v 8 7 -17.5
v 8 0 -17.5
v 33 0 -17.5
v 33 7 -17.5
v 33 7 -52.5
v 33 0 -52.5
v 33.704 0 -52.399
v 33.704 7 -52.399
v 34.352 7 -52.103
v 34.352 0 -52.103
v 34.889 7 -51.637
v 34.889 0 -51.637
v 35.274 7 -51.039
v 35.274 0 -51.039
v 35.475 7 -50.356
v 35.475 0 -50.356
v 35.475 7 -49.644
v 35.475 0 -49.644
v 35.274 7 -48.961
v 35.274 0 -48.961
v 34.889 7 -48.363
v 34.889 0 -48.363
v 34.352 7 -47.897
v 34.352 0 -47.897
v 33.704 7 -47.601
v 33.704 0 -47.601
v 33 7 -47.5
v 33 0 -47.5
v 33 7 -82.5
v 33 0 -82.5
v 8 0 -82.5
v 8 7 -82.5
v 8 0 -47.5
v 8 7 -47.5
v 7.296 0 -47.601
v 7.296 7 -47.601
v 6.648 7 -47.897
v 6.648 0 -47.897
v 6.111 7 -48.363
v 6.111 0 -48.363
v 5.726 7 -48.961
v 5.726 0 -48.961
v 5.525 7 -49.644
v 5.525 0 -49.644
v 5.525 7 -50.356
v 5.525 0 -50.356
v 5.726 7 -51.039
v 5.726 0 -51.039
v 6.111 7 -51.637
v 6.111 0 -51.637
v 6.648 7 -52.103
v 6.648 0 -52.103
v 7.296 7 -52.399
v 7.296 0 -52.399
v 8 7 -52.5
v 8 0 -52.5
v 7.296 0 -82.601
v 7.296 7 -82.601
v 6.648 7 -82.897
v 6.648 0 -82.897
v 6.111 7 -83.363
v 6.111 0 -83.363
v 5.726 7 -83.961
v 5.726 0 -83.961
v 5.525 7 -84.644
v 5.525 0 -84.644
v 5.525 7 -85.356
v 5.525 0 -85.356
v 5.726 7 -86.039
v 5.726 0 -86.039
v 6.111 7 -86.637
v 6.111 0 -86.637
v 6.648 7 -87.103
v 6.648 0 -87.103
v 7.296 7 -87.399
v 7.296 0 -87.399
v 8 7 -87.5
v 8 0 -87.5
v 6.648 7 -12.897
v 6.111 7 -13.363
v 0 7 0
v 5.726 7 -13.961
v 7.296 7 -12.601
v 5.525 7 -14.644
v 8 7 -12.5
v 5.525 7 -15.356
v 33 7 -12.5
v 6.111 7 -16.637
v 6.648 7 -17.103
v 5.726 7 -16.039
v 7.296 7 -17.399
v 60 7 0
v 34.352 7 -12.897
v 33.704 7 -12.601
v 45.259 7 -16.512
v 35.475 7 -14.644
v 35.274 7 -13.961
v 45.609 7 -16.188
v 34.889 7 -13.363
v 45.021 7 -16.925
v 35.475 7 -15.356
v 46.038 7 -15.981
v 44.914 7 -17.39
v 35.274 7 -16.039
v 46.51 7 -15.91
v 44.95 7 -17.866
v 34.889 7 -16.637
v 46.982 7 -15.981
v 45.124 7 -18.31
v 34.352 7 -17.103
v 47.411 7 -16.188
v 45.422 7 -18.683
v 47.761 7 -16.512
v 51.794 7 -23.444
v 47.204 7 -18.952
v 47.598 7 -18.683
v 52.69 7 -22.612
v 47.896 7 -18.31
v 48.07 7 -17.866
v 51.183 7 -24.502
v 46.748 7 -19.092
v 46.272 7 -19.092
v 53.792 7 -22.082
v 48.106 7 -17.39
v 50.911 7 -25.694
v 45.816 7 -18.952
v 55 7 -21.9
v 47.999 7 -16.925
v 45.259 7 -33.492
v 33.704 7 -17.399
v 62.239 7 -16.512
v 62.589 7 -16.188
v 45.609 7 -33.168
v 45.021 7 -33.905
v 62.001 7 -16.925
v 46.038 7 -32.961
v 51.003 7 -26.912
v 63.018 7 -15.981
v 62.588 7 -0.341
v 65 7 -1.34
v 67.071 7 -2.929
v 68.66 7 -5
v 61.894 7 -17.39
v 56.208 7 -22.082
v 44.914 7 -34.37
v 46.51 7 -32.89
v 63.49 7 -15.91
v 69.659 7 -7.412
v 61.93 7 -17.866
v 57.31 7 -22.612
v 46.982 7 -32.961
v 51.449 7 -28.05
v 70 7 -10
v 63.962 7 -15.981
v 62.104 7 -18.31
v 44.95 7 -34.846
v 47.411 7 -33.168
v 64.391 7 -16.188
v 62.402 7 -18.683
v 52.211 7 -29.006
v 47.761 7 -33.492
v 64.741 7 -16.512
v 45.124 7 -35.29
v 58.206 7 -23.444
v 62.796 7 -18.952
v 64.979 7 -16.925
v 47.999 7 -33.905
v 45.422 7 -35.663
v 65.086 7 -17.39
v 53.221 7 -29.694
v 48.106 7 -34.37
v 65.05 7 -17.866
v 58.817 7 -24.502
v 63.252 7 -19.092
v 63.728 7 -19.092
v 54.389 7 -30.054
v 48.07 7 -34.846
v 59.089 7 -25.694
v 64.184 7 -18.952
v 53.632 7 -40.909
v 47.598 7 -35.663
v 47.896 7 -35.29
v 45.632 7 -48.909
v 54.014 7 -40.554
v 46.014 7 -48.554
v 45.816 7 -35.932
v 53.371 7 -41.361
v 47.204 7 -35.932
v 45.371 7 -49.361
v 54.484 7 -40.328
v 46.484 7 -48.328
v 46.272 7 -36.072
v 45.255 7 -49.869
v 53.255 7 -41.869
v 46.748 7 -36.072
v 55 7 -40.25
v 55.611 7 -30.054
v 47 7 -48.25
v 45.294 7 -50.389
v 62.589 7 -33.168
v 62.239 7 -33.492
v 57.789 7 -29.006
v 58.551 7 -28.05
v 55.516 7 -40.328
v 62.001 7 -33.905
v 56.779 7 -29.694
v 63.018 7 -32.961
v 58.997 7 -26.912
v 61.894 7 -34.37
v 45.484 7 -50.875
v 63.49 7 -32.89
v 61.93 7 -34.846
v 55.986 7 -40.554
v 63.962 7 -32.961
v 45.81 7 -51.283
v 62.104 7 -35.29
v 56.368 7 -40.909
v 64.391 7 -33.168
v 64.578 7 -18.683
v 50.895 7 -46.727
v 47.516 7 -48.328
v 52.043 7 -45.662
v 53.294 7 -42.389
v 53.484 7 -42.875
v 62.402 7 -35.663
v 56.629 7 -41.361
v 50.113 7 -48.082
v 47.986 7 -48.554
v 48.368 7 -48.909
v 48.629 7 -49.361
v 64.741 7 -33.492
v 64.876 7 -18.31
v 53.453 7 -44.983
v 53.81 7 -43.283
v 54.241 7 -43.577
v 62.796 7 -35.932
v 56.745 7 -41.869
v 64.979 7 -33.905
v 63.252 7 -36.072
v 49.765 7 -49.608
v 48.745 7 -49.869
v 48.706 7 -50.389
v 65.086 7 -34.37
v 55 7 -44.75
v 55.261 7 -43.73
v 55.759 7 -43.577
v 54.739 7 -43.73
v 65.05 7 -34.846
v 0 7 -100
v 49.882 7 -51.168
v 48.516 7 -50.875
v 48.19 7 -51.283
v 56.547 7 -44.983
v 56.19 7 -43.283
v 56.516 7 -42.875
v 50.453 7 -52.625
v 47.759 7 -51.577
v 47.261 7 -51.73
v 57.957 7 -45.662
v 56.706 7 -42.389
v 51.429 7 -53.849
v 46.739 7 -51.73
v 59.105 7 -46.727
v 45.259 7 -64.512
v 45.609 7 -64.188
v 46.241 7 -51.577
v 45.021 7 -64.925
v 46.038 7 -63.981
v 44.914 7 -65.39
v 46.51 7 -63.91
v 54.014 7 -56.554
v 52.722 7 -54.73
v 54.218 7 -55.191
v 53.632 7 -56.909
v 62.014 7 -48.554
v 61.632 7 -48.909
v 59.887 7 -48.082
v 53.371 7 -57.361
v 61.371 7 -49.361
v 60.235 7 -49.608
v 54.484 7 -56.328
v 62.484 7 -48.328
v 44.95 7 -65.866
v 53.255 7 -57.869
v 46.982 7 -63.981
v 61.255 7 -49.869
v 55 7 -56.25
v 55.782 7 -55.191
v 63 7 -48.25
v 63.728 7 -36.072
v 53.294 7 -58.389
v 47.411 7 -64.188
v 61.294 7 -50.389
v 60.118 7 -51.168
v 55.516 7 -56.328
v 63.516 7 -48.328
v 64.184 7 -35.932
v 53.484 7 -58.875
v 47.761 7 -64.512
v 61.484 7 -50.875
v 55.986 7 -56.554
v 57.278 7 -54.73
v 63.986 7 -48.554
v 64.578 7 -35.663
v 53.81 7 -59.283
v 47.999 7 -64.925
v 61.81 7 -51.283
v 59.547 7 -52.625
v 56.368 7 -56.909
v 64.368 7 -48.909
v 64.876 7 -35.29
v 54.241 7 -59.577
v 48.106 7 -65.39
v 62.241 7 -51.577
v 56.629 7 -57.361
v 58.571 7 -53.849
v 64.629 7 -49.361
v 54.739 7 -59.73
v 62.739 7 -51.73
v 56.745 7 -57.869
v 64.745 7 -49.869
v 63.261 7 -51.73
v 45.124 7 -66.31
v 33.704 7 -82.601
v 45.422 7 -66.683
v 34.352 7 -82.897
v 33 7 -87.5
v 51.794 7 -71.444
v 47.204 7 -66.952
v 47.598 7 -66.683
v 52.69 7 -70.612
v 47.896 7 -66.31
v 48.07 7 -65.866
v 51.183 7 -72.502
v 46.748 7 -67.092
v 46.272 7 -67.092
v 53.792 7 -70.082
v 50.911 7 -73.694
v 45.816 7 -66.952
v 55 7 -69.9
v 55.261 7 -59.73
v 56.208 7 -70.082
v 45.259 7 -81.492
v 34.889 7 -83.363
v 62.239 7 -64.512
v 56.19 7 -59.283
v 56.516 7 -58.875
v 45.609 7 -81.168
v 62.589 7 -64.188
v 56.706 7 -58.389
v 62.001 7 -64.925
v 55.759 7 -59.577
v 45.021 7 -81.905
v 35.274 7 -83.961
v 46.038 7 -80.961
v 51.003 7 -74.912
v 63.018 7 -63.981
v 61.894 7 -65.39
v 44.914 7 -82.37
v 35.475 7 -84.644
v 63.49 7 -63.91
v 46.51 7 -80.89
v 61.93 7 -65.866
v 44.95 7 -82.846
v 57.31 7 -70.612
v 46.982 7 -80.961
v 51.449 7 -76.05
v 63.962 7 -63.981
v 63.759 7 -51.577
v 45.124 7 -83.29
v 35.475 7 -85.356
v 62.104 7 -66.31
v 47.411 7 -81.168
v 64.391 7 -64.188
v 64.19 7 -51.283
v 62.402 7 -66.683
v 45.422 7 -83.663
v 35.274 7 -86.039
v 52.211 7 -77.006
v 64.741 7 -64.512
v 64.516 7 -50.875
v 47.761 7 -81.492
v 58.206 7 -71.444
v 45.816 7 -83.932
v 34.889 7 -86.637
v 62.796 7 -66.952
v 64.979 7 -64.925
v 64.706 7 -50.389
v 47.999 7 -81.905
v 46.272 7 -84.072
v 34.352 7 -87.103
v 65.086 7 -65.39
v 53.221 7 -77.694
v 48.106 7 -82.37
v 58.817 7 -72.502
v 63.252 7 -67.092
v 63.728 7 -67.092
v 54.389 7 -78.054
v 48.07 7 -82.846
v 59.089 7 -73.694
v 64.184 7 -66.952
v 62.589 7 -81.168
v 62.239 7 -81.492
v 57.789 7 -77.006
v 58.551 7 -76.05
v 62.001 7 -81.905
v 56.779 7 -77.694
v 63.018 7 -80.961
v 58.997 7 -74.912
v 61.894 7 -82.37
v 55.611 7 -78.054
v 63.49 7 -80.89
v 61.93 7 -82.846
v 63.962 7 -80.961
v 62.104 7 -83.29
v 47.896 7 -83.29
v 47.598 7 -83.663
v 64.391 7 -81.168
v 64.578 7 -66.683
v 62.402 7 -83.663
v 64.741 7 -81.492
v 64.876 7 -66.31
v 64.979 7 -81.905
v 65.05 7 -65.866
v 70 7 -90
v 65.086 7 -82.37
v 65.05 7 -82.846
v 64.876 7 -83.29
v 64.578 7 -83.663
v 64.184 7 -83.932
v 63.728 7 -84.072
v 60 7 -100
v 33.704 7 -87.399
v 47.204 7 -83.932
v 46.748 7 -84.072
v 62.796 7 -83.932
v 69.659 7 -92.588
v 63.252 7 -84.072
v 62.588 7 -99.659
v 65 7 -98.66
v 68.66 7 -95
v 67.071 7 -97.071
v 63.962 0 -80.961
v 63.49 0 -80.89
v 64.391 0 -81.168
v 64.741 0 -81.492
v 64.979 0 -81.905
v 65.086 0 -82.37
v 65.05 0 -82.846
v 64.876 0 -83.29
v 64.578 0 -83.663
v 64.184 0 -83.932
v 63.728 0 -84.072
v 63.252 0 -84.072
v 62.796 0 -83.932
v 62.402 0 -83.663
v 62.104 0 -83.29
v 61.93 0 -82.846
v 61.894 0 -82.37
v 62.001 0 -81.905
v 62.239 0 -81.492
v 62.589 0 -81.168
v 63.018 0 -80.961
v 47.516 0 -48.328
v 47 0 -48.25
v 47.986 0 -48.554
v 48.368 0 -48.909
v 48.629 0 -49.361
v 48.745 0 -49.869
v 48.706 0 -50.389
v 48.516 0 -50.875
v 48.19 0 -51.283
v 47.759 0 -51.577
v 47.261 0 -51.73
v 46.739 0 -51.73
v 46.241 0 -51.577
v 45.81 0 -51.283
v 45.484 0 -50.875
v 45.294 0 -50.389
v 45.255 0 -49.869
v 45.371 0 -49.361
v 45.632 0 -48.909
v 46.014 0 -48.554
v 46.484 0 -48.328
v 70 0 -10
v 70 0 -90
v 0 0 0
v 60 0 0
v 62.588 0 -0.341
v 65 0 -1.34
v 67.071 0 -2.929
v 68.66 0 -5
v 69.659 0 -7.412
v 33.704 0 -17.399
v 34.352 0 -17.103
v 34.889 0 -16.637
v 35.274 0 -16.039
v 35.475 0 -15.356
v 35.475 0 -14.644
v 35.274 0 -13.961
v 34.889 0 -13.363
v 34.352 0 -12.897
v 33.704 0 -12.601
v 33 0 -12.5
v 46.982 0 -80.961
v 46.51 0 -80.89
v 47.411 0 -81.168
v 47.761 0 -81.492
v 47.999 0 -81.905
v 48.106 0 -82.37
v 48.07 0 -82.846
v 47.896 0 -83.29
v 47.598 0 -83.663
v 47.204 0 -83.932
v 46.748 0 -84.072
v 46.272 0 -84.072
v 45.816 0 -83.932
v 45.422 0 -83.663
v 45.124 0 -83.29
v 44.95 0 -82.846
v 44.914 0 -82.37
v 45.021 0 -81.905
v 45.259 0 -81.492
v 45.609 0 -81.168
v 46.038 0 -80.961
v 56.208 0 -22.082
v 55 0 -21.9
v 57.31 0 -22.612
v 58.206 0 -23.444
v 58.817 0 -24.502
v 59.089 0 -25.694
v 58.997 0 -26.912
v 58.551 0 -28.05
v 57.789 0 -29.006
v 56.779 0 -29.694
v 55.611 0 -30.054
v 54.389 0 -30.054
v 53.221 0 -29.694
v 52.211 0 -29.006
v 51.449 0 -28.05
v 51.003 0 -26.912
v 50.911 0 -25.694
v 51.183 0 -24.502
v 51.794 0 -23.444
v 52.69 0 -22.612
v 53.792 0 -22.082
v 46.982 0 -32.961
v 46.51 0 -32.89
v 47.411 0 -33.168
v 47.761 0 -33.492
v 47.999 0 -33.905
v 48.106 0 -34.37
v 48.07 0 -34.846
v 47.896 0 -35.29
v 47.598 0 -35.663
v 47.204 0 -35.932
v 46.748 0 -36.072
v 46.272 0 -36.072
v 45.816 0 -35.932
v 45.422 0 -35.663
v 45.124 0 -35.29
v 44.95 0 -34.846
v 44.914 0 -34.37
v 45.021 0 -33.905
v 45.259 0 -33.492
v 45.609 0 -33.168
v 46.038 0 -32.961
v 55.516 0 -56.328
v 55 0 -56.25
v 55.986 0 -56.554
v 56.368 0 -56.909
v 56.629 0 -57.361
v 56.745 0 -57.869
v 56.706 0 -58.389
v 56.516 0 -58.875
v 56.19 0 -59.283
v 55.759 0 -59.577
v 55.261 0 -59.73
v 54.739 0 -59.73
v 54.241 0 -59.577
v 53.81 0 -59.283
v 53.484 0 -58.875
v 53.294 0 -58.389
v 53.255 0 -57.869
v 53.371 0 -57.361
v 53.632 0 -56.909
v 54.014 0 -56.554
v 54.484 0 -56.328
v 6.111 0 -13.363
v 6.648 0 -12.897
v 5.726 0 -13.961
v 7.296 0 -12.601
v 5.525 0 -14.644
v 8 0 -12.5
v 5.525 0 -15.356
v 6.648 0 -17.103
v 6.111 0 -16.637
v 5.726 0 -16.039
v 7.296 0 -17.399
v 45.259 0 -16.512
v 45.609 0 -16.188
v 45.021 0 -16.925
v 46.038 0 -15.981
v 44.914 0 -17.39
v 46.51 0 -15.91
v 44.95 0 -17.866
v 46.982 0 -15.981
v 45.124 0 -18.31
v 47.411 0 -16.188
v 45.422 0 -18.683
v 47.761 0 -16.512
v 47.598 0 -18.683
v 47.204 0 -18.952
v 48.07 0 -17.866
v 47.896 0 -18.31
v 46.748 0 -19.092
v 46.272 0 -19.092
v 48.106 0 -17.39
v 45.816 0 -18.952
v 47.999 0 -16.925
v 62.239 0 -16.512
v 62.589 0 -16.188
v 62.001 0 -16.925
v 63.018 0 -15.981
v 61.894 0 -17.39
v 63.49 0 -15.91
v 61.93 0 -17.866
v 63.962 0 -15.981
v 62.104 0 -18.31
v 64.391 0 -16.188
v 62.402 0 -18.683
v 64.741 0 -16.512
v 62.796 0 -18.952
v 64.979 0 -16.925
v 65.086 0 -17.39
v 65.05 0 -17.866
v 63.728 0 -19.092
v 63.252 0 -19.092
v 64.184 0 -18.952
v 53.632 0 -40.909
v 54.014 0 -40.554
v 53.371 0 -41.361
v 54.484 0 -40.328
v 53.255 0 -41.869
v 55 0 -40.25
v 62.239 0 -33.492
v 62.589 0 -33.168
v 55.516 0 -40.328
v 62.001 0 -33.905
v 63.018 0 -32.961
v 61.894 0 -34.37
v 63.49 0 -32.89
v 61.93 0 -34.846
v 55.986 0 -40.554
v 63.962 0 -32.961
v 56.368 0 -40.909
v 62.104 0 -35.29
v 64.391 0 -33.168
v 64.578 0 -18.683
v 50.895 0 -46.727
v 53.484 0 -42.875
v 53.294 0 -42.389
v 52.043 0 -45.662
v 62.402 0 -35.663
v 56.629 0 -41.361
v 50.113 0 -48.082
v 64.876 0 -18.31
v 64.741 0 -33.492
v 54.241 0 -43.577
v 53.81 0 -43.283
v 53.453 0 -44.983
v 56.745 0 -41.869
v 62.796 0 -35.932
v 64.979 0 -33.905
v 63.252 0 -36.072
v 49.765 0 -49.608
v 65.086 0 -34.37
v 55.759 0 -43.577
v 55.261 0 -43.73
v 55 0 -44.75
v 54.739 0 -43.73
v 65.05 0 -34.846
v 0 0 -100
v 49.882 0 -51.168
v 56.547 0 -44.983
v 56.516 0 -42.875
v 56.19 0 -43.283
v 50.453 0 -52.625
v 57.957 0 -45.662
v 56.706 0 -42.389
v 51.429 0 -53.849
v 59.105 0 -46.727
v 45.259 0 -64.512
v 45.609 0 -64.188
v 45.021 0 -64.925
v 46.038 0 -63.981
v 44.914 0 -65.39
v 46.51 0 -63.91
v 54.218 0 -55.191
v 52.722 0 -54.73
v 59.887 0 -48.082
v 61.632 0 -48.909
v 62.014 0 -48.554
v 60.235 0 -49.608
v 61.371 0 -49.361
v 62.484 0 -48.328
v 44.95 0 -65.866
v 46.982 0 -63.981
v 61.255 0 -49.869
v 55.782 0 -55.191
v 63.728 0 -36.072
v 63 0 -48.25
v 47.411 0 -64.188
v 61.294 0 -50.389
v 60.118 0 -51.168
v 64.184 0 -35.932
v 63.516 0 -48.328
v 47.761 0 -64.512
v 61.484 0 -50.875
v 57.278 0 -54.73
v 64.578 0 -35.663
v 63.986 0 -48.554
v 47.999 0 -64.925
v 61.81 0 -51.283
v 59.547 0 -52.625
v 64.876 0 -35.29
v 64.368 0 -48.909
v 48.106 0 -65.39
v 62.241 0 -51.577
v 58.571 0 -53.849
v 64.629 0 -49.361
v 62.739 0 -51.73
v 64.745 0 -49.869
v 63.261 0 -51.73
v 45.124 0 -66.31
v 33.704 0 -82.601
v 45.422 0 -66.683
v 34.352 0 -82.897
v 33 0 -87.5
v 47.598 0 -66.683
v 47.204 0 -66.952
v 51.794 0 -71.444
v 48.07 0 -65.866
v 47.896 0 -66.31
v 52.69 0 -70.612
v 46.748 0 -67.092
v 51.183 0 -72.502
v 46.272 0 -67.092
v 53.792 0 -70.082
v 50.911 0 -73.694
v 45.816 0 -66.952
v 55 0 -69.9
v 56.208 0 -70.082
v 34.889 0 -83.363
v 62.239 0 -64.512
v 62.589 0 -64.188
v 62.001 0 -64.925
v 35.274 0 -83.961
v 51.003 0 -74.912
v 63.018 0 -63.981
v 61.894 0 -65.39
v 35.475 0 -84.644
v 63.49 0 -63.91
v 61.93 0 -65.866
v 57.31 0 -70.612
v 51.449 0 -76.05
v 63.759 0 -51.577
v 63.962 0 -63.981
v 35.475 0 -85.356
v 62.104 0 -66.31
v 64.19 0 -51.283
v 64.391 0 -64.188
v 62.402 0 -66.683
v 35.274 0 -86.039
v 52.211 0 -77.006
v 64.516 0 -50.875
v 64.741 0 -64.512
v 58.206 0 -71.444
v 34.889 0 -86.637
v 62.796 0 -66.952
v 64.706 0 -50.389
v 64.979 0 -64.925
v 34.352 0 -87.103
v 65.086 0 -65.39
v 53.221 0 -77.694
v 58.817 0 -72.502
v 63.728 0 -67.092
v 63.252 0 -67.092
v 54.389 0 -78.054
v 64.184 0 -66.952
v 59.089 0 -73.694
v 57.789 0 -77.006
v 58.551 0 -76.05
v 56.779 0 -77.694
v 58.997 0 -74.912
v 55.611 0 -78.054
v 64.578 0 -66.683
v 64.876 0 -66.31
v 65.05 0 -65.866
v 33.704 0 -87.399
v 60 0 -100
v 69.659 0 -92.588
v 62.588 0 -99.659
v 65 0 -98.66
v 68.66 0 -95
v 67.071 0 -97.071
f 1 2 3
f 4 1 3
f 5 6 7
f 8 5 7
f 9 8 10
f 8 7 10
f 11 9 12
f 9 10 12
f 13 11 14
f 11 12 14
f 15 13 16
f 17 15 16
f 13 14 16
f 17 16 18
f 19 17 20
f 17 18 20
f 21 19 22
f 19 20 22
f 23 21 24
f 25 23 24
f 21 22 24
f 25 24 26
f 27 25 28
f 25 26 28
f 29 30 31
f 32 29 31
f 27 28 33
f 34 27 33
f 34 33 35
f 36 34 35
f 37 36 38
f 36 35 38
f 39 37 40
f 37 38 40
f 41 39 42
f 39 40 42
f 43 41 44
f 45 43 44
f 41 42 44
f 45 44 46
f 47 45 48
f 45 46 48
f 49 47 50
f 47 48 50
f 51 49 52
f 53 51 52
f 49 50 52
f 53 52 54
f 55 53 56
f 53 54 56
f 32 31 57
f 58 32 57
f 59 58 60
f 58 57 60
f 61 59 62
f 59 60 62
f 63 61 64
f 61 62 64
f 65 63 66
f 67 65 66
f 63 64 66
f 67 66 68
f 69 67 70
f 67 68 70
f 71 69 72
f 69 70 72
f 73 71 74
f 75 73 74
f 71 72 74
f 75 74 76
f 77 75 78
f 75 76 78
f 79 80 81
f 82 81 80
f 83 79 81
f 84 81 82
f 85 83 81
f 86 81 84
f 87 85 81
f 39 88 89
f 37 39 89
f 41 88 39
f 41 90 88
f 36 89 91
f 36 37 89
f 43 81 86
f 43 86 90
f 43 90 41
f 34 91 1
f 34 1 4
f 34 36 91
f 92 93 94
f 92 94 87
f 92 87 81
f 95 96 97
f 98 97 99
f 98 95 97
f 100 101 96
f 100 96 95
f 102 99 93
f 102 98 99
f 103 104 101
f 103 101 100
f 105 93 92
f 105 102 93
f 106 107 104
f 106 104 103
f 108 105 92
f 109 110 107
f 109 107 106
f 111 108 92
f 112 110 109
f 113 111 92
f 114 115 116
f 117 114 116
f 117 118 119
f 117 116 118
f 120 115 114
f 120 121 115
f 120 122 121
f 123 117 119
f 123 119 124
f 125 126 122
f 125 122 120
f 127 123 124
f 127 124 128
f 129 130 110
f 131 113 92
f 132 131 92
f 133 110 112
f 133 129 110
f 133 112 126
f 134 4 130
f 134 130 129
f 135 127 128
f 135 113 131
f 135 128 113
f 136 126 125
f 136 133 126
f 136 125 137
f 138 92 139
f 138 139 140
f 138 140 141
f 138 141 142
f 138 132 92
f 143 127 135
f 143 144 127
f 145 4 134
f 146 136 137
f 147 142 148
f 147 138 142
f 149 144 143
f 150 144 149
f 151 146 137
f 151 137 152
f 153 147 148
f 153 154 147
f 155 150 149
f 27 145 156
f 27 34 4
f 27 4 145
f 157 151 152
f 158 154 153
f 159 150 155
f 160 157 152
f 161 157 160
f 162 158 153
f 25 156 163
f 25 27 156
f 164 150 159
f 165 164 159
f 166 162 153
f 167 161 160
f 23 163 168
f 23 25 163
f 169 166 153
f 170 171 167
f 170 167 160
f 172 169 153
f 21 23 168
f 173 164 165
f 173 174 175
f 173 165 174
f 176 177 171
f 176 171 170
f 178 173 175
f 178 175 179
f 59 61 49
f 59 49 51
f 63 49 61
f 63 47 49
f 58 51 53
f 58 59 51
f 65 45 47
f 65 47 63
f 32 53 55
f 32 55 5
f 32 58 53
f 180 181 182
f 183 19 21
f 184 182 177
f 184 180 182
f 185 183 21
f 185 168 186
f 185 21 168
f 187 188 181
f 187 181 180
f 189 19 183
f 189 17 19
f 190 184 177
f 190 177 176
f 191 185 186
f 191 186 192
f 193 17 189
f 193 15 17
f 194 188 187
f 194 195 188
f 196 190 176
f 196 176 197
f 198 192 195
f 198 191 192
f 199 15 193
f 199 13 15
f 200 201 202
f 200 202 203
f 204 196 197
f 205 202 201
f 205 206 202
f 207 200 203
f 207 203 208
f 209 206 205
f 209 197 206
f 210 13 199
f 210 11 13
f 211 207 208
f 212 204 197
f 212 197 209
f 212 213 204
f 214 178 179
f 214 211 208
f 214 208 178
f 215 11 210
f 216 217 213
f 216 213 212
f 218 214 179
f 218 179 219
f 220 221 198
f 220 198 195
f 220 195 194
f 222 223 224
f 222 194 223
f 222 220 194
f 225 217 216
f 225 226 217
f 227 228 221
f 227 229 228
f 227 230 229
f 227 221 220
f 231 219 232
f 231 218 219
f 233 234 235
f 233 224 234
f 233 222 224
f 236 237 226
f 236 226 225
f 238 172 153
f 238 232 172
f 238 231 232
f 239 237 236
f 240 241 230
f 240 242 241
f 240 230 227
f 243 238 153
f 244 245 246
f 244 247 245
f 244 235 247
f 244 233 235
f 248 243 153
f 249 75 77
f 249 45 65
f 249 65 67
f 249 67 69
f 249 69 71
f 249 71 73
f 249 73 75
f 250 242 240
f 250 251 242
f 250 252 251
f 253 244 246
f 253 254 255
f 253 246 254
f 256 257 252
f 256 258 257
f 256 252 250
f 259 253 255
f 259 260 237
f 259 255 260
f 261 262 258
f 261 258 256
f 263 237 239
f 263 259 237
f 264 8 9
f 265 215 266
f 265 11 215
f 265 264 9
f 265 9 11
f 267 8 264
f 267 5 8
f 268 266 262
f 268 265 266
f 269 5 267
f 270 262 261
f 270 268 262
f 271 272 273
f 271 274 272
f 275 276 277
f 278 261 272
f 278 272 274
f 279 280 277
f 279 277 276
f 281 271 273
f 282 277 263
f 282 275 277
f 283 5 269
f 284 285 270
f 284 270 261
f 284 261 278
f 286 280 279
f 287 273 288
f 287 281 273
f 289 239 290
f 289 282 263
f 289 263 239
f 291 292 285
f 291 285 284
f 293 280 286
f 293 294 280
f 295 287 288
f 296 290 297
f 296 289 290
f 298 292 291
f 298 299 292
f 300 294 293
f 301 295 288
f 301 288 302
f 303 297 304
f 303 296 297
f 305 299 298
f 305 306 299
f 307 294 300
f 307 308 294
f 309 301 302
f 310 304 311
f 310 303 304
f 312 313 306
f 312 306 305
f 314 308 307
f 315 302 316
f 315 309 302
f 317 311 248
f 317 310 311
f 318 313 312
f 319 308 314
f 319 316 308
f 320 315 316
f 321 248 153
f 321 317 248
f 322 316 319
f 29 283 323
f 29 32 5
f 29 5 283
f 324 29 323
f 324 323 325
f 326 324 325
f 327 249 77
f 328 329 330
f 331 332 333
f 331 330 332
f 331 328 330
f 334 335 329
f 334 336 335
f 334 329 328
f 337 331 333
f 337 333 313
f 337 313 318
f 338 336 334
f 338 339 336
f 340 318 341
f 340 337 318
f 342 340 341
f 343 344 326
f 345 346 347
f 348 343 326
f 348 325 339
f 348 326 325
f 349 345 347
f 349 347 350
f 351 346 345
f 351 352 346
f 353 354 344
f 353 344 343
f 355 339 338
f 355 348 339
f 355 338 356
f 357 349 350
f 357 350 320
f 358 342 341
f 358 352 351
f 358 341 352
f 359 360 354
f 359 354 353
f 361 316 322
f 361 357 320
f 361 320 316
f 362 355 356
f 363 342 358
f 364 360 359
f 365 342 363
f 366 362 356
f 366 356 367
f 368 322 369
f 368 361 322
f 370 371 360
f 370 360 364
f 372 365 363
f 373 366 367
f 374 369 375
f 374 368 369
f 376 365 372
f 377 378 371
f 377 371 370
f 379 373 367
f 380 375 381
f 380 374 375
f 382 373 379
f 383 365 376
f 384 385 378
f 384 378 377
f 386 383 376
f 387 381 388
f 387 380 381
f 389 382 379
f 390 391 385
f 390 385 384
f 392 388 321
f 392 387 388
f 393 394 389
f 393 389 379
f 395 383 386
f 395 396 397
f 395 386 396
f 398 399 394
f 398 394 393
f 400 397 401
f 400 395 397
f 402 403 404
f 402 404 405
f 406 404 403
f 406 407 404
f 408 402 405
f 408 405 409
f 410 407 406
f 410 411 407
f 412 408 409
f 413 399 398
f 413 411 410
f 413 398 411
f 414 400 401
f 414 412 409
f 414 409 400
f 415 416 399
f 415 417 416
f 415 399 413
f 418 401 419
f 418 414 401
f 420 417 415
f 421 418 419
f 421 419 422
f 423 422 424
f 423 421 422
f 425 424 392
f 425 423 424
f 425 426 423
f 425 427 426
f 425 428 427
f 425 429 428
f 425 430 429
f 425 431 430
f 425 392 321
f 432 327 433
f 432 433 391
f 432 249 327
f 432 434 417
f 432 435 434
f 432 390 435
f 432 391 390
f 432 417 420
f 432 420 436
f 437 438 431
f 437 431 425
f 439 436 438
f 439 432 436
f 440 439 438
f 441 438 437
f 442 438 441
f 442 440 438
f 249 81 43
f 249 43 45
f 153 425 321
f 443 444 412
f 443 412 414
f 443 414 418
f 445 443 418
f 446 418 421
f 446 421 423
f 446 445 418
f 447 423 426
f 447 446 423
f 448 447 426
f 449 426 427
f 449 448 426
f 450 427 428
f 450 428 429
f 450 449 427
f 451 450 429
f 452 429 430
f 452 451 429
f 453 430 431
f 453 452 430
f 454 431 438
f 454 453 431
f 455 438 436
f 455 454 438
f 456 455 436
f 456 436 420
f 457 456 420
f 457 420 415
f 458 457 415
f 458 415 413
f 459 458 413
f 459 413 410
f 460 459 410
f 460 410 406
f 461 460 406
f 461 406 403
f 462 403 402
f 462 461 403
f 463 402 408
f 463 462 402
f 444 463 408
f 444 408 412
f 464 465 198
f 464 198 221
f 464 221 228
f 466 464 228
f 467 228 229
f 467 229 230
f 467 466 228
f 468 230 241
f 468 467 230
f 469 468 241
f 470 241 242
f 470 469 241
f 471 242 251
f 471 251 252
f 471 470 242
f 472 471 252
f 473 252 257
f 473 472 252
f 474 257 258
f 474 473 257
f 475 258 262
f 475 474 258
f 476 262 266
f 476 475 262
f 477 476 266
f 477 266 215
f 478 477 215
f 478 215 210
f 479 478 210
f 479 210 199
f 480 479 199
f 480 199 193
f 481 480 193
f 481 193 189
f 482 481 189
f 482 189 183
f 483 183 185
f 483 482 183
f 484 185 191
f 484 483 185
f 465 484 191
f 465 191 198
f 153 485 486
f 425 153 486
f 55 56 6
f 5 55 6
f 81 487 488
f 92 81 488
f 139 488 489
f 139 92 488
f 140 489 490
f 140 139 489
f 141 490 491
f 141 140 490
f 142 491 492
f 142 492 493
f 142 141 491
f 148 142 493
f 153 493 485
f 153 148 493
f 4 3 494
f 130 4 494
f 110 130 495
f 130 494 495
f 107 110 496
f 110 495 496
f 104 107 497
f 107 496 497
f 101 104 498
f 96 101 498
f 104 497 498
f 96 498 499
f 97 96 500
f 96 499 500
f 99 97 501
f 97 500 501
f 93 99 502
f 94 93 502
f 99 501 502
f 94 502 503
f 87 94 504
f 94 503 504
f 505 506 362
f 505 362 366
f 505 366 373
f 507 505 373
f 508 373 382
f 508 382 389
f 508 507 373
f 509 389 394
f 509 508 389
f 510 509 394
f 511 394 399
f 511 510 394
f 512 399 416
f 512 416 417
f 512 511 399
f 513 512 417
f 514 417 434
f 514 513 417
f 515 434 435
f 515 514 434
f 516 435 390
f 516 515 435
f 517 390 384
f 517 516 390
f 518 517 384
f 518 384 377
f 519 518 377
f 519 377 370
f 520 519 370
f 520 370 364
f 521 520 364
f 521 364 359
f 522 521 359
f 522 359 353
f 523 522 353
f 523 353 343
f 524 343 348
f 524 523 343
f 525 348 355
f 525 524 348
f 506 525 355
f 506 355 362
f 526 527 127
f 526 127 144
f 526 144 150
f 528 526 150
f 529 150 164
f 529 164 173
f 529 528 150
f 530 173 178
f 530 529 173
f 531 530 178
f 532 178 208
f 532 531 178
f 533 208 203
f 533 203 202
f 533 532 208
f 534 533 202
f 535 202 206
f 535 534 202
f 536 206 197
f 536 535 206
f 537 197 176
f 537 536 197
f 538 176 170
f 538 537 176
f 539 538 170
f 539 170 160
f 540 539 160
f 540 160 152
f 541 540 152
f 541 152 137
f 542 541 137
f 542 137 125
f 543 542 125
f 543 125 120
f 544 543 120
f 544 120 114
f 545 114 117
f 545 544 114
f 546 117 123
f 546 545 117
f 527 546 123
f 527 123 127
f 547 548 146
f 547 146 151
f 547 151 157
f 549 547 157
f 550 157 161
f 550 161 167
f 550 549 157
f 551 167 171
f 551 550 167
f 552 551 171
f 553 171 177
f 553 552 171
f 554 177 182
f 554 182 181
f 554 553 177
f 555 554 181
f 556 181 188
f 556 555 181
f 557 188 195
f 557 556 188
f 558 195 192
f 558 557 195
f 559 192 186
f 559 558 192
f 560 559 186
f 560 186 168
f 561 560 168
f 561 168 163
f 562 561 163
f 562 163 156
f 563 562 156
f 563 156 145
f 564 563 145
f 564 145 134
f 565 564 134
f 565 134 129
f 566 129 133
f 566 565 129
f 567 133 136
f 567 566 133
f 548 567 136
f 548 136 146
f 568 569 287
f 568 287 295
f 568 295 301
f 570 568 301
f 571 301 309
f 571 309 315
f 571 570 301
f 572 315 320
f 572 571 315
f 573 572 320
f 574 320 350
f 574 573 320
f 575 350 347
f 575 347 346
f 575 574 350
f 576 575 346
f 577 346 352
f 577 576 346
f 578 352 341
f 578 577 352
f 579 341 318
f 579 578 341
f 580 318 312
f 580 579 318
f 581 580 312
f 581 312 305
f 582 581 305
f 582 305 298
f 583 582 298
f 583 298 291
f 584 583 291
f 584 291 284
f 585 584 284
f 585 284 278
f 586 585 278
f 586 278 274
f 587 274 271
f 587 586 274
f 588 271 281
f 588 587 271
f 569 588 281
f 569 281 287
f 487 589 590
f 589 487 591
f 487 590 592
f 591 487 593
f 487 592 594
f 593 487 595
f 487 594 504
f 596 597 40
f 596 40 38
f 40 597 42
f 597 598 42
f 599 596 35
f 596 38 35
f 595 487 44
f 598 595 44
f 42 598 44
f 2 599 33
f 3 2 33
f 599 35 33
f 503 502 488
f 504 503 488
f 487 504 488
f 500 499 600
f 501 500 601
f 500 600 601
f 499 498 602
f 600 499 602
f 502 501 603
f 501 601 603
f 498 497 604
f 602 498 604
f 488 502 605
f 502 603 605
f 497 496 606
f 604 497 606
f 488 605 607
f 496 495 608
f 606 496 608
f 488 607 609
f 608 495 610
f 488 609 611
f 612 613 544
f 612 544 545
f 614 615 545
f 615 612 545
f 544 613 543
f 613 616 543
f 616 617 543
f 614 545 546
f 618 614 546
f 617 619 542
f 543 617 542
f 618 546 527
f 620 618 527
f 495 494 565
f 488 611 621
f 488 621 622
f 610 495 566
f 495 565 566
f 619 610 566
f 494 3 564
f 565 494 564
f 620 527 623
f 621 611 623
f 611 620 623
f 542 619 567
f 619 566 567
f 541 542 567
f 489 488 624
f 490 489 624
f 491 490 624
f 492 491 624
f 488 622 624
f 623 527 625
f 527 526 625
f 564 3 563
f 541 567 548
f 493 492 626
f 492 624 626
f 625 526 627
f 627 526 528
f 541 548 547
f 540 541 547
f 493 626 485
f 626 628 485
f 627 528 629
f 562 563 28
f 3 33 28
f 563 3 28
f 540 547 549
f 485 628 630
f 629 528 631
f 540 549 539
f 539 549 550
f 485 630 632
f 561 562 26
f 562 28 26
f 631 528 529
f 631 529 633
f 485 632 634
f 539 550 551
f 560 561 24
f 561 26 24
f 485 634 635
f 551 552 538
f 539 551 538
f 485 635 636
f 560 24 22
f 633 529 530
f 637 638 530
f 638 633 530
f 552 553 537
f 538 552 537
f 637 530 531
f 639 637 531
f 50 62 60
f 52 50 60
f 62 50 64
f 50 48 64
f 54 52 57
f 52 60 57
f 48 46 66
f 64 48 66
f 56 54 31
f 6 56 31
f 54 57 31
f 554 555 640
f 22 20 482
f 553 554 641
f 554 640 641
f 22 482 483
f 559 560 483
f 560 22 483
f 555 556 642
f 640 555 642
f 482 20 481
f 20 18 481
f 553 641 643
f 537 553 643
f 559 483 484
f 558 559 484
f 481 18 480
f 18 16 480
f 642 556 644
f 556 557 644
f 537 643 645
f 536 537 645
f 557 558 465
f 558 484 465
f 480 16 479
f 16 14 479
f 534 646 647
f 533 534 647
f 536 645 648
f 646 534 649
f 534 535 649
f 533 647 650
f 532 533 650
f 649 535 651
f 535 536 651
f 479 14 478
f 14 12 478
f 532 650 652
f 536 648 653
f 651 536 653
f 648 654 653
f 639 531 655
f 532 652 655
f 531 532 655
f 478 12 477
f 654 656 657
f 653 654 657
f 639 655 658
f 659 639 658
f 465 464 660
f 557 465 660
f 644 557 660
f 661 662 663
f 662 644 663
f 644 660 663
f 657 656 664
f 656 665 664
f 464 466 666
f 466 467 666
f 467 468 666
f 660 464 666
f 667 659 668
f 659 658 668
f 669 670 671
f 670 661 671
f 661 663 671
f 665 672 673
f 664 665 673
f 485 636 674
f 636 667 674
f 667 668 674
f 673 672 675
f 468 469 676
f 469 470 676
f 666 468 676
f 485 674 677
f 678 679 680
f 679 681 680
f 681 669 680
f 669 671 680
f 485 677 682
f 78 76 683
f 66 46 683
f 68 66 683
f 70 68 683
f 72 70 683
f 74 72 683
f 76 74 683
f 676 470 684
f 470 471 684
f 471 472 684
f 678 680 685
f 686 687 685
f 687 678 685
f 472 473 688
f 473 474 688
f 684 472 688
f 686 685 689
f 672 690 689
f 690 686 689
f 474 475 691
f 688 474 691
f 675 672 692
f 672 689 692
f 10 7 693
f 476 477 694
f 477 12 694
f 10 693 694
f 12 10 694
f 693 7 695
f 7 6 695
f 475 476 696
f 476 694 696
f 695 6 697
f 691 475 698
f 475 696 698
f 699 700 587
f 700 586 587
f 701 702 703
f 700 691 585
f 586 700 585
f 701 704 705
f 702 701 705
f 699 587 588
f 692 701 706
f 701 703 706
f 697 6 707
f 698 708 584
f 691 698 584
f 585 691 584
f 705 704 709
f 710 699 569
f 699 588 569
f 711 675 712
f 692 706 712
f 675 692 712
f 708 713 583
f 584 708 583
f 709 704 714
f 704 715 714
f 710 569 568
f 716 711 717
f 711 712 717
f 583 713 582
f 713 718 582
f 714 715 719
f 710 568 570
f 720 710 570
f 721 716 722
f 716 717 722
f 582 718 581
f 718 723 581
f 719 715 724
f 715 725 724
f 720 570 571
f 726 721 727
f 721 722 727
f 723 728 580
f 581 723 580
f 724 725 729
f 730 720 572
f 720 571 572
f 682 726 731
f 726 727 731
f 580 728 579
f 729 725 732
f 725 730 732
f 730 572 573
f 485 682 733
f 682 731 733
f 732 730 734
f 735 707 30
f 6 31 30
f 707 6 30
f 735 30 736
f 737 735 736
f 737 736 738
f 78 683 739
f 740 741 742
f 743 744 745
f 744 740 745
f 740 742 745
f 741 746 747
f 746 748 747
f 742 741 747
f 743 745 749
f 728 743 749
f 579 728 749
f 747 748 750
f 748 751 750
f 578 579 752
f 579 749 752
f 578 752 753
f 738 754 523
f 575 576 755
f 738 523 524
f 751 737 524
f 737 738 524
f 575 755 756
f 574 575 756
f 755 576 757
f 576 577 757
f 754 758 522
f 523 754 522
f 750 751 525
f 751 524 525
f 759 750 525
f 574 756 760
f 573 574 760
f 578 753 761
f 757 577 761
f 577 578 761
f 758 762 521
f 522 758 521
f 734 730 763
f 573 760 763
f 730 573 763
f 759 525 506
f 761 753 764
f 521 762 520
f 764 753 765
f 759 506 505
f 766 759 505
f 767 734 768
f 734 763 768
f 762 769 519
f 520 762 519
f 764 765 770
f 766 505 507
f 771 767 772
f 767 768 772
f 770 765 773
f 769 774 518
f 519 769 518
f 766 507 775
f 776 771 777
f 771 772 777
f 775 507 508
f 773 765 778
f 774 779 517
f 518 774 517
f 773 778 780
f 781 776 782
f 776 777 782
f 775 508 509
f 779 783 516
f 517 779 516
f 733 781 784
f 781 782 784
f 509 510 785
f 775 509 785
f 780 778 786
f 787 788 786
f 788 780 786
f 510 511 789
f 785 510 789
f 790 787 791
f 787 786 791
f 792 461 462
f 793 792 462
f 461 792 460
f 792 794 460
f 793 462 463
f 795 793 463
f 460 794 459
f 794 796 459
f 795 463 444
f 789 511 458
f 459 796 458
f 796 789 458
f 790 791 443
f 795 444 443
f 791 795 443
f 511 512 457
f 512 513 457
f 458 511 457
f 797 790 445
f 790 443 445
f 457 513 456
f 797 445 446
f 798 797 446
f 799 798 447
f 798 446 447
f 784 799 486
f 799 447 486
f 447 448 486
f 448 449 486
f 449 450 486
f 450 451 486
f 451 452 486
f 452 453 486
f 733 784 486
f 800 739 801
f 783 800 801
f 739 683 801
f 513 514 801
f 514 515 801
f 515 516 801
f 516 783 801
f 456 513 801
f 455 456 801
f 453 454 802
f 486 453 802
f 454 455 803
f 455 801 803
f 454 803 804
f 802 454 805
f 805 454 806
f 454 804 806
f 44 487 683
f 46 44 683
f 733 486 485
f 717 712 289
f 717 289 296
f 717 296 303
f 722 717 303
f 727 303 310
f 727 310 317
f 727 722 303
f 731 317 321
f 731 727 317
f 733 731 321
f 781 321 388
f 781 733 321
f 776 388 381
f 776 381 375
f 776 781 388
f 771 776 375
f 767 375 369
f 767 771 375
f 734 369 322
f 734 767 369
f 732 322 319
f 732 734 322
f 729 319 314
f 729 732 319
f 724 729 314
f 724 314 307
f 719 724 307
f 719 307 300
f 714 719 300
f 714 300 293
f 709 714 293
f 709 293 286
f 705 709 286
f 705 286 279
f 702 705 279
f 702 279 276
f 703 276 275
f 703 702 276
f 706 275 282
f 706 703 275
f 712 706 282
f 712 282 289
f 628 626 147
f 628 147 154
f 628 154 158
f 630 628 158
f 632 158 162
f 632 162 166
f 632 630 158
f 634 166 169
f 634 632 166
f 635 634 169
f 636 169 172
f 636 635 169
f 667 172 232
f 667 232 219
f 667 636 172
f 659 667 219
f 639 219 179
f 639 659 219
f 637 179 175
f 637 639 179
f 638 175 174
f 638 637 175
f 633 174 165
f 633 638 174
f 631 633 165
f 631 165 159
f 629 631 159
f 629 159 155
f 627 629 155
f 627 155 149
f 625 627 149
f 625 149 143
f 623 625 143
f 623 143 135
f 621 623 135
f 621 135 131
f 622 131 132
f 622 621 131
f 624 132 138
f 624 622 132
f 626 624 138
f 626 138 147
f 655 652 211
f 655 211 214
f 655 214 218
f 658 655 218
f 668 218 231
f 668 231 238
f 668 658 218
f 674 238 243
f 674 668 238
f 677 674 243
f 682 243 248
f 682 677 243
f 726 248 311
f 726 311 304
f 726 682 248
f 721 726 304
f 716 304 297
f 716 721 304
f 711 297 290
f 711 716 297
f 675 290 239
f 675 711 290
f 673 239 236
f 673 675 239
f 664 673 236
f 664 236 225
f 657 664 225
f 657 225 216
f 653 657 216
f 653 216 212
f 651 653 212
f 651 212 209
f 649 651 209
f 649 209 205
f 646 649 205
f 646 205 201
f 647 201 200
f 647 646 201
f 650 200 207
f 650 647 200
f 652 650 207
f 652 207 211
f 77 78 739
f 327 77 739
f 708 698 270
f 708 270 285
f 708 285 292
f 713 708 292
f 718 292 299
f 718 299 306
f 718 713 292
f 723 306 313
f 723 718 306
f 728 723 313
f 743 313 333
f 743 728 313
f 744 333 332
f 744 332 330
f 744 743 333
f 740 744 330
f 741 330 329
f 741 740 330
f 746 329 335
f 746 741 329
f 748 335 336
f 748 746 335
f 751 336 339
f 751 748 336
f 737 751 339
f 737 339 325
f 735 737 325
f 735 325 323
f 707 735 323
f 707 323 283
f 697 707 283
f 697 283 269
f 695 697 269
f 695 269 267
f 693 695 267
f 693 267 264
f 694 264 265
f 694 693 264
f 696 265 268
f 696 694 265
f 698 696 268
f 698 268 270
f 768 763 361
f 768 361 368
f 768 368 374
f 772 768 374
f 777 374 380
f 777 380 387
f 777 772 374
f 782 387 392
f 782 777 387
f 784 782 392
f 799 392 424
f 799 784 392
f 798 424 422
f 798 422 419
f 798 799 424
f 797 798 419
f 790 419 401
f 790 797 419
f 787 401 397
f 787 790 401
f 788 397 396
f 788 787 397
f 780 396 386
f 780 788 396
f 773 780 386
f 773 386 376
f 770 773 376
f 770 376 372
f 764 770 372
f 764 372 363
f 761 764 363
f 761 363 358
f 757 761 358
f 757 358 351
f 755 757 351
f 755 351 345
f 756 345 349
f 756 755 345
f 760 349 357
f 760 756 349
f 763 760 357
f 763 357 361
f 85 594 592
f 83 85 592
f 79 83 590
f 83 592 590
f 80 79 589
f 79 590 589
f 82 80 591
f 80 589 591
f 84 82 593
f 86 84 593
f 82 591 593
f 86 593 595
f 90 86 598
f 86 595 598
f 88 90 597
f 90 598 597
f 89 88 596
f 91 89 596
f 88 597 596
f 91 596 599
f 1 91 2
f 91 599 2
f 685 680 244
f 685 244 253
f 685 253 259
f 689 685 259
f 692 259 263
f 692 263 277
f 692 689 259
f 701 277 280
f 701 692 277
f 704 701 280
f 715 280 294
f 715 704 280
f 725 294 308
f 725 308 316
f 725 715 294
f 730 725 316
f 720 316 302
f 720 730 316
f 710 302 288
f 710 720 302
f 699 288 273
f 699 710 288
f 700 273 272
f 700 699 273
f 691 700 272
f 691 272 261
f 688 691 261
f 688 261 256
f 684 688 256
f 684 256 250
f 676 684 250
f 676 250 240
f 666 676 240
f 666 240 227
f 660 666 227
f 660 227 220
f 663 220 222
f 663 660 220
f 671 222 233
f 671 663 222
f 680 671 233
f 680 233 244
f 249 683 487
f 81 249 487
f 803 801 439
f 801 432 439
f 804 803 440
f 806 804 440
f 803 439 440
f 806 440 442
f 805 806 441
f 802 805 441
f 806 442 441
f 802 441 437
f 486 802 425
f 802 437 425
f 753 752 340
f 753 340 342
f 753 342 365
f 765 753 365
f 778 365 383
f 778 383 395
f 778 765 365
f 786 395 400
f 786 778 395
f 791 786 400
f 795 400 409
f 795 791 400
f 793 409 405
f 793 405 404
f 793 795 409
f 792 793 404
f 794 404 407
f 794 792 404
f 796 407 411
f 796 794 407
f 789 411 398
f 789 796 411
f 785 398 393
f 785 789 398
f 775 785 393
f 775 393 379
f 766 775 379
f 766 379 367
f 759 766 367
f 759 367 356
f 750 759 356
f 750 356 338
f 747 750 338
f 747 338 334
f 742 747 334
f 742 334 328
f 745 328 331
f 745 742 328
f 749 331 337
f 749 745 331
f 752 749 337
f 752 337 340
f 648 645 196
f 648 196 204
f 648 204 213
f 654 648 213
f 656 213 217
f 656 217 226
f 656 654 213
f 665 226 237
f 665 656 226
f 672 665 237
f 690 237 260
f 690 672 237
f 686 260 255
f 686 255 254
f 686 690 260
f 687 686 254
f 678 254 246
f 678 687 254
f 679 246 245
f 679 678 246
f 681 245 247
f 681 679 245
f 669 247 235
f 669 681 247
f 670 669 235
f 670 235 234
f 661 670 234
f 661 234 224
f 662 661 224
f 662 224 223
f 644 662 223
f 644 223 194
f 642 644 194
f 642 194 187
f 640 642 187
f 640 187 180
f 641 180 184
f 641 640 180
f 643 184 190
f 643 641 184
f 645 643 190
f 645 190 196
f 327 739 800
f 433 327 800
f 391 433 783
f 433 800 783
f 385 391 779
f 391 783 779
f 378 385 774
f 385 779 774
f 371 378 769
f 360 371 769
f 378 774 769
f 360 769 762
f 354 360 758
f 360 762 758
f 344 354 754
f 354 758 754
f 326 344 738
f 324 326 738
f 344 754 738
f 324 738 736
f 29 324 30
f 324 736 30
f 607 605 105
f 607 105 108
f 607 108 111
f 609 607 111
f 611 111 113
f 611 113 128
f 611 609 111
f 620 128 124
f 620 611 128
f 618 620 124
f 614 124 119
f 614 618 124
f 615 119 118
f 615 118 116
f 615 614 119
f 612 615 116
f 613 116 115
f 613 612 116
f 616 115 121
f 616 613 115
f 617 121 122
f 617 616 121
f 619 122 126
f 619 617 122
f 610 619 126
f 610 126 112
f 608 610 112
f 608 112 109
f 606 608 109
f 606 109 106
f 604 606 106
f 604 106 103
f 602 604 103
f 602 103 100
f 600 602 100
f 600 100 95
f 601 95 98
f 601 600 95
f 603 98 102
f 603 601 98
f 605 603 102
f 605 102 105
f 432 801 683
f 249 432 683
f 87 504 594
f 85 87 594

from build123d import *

# Parameters (mm, degrees)
SKETCH1_R           = 1.6
SKETCH1_R_2         = 4.1
SKETCH1_R_3         = 1.75
SKETCH1_R_4         = 5.25
BOSS_EXTRUDE1_DEPTH = 7
FILLET1_R           = 10


with BuildPart() as part:
    # Sketch1 → Boss-Extrude1 (new body)
    # profile 1 of 3: a face of its own
    with BuildSketch(Plane(origin=(0, 0, 0), x_dir=(1, 0, 0), z_dir=(0, 1, 0))):
        Polygon((0, 100), (0, 0), (56, 0), (70, 0), (70, 100), align=None)
        with BuildLine():
            Line((33, 12.5), (8, 12.5))
            ThreePointArc((8, 12.5), (5.5, 15), (8, 17.5))
            Line((8, 17.5), (33, 17.5))
            ThreePointArc((33, 17.5), (35.5, 15), (33, 12.5))
        make_face(mode=Mode.SUBTRACT)
        with Locations(Location((46.51, 17.51, 0), (0, 0, 270))):
            Circle(SKETCH1_R, mode=Mode.SUBTRACT)
        with Locations(Location((63.49, 17.51, 0), (0, 0, 270))):
            Circle(SKETCH1_R, mode=Mode.SUBTRACT)
        with Locations(Location((46.51, 34.49, 0), (0, 0, 270))):
            Circle(SKETCH1_R, mode=Mode.SUBTRACT)
        with Locations(Location((55, 26, 0), (0, 0, 270))):
            Circle(SKETCH1_R_2, mode=Mode.SUBTRACT)
        with Locations(Location((63.49, 34.49, 0), (0, 0, 270))):
            Circle(SKETCH1_R, mode=Mode.SUBTRACT)
        with Locations(Location((55, 42, 0), (0, 0, 270))):
            Circle(SKETCH1_R_3, mode=Mode.SUBTRACT)
        with BuildLine():
            ThreePointArc((8, 47.5), (5.5, 50), (8, 52.5))
            Line((8, 52.5), (33, 52.5))
            ThreePointArc((33, 52.5), (35.5, 50), (33, 47.5))
            Line((33, 47.5), (8, 47.5))
        make_face(mode=Mode.SUBTRACT)
        with BuildLine():
            ThreePointArc((8, 82.5), (5.5, 85), (8, 87.5))
            Line((8, 87.5), (33, 87.5))
            ThreePointArc((33, 87.5), (35.5, 85), (33, 82.5))
            Line((33, 82.5), (8, 82.5))
        make_face(mode=Mode.SUBTRACT)
        with Locations(Location((47, 50, 0), (0, 0, 270))):
            Circle(SKETCH1_R_3, mode=Mode.SUBTRACT)
        with Locations(Location((46.51, 65.51, 0), (0, 0, 270))):
            Circle(SKETCH1_R, mode=Mode.SUBTRACT)
        with Locations(Location((55, 50, 0), (0, 0, 270))):
            Circle(SKETCH1_R_4, mode=Mode.SUBTRACT)
        with Locations(Location((55, 58, 0), (0, 0, 270))):
            Circle(SKETCH1_R_3, mode=Mode.SUBTRACT)
        with Locations(Location((63, 50, 0), (0, 0, 270))):
            Circle(SKETCH1_R_3, mode=Mode.SUBTRACT)
        with Locations(Location((55, 74, 0), (0, 0, 270))):
            Circle(SKETCH1_R_2, mode=Mode.SUBTRACT)
        with Locations(Location((63.49, 65.51, 0), (0, 0, 270))):
            Circle(SKETCH1_R, mode=Mode.SUBTRACT)
        with Locations(Location((46.51, 82.49, 0), (0, 0, 270))):
            Circle(SKETCH1_R, mode=Mode.SUBTRACT)
        with Locations(Location((63.49, 82.49, 0), (0, 0, 270))):
            Circle(SKETCH1_R, mode=Mode.SUBTRACT)
    # profile 2 of 3: a face of its own
    with BuildSketch(Plane(origin=(0, 0, 0), x_dir=(1, 0, 0), z_dir=(0, 1, 0))):
        Polygon((0, 100), (0, 0), (56, 0), (70, 0), (70, 100), align=None)
        with BuildLine():
            Line((33, 12.5), (8, 12.5))
            ThreePointArc((8, 12.5), (5.5, 15), (8, 17.5))
            Line((8, 17.5), (33, 17.5))
            ThreePointArc((33, 17.5), (35.5, 15), (33, 12.5))
        make_face(mode=Mode.SUBTRACT)
        with Locations(Location((46.51, 17.51, 0), (0, 0, 270))):
            Circle(SKETCH1_R, mode=Mode.SUBTRACT)
        with Locations(Location((63.49, 17.51, 0), (0, 0, 270))):
            Circle(SKETCH1_R, mode=Mode.SUBTRACT)
        with Locations(Location((46.51, 34.49, 0), (0, 0, 270))):
            Circle(SKETCH1_R, mode=Mode.SUBTRACT)
        with Locations(Location((55, 26, 0), (0, 0, 270))):
            Circle(SKETCH1_R_2, mode=Mode.SUBTRACT)
        with Locations(Location((63.49, 34.49, 0), (0, 0, 270))):
            Circle(SKETCH1_R, mode=Mode.SUBTRACT)
        with Locations(Location((55, 42, 0), (0, 0, 270))):
            Circle(SKETCH1_R_3, mode=Mode.SUBTRACT)
        with BuildLine():
            ThreePointArc((8, 47.5), (5.5, 50), (8, 52.5))
            Line((8, 52.5), (33, 52.5))
            ThreePointArc((33, 52.5), (35.5, 50), (33, 47.5))
            Line((33, 47.5), (8, 47.5))
        make_face(mode=Mode.SUBTRACT)
        with BuildLine():
            ThreePointArc((8, 82.5), (5.5, 85), (8, 87.5))
            Line((8, 87.5), (33, 87.5))
            ThreePointArc((33, 87.5), (35.5, 85), (33, 82.5))
            Line((33, 82.5), (8, 82.5))
        make_face(mode=Mode.SUBTRACT)
        with Locations(Location((47, 50, 0), (0, 0, 270))):
            Circle(SKETCH1_R_3, mode=Mode.SUBTRACT)
        with Locations(Location((46.51, 65.51, 0), (0, 0, 270))):
            Circle(SKETCH1_R, mode=Mode.SUBTRACT)
        with Locations(Location((55, 50, 0), (0, 0, 270))):
            Circle(SKETCH1_R_4, mode=Mode.SUBTRACT)
        with Locations(Location((55, 58, 0), (0, 0, 270))):
            Circle(SKETCH1_R_3, mode=Mode.SUBTRACT)
        with Locations(Location((63, 50, 0), (0, 0, 270))):
            Circle(SKETCH1_R_3, mode=Mode.SUBTRACT)
        with Locations(Location((55, 74, 0), (0, 0, 270))):
            Circle(SKETCH1_R_2, mode=Mode.SUBTRACT)
        with Locations(Location((63.49, 65.51, 0), (0, 0, 270))):
            Circle(SKETCH1_R, mode=Mode.SUBTRACT)
        with Locations(Location((46.51, 82.49, 0), (0, 0, 270))):
            Circle(SKETCH1_R, mode=Mode.SUBTRACT)
        with Locations(Location((63.49, 82.49, 0), (0, 0, 270))):
            Circle(SKETCH1_R, mode=Mode.SUBTRACT)
    # profile 3 of 3: a face of its own
    with BuildSketch(Plane(origin=(0, 0, 0), x_dir=(1, 0, 0), z_dir=(0, 1, 0))):
        Polygon((0, 100), (0, 0), (56, 0), (70, 0), (70, 100), align=None)
        with BuildLine():
            Line((33, 12.5), (8, 12.5))
            ThreePointArc((8, 12.5), (5.5, 15), (8, 17.5))
            Line((8, 17.5), (33, 17.5))
            ThreePointArc((33, 17.5), (35.5, 15), (33, 12.5))
        make_face(mode=Mode.SUBTRACT)
        with Locations(Location((46.51, 17.51, 0), (0, 0, 270))):
            Circle(SKETCH1_R, mode=Mode.SUBTRACT)
        with Locations(Location((63.49, 17.51, 0), (0, 0, 270))):
            Circle(SKETCH1_R, mode=Mode.SUBTRACT)
        with Locations(Location((46.51, 34.49, 0), (0, 0, 270))):
            Circle(SKETCH1_R, mode=Mode.SUBTRACT)
        with Locations(Location((55, 26, 0), (0, 0, 270))):
            Circle(SKETCH1_R_2, mode=Mode.SUBTRACT)
        with Locations(Location((63.49, 34.49, 0), (0, 0, 270))):
            Circle(SKETCH1_R, mode=Mode.SUBTRACT)
        with Locations(Location((55, 42, 0), (0, 0, 270))):
            Circle(SKETCH1_R_3, mode=Mode.SUBTRACT)
        with BuildLine():
            ThreePointArc((8, 47.5), (5.5, 50), (8, 52.5))
            Line((8, 52.5), (33, 52.5))
            ThreePointArc((33, 52.5), (35.5, 50), (33, 47.5))
            Line((33, 47.5), (8, 47.5))
        make_face(mode=Mode.SUBTRACT)
        with BuildLine():
            ThreePointArc((8, 82.5), (5.5, 85), (8, 87.5))
            Line((8, 87.5), (33, 87.5))
            ThreePointArc((33, 87.5), (35.5, 85), (33, 82.5))
            Line((33, 82.5), (8, 82.5))
        make_face(mode=Mode.SUBTRACT)
        with Locations(Location((47, 50, 0), (0, 0, 270))):
            Circle(SKETCH1_R_3, mode=Mode.SUBTRACT)
        with Locations(Location((46.51, 65.51, 0), (0, 0, 270))):
            Circle(SKETCH1_R, mode=Mode.SUBTRACT)
        with Locations(Location((55, 50, 0), (0, 0, 270))):
            Circle(SKETCH1_R_4, mode=Mode.SUBTRACT)
        with Locations(Location((55, 58, 0), (0, 0, 270))):
            Circle(SKETCH1_R_3, mode=Mode.SUBTRACT)
        with Locations(Location((63, 50, 0), (0, 0, 270))):
            Circle(SKETCH1_R_3, mode=Mode.SUBTRACT)
        with Locations(Location((55, 74, 0), (0, 0, 270))):
            Circle(SKETCH1_R_2, mode=Mode.SUBTRACT)
        with Locations(Location((63.49, 65.51, 0), (0, 0, 270))):
            Circle(SKETCH1_R, mode=Mode.SUBTRACT)
        with Locations(Location((46.51, 82.49, 0), (0, 0, 270))):
            Circle(SKETCH1_R, mode=Mode.SUBTRACT)
        with Locations(Location((63.49, 82.49, 0), (0, 0, 270))):
            Circle(SKETCH1_R, mode=Mode.SUBTRACT)
    extrude(amount=BOSS_EXTRUDE1_DEPTH)

    # Fillet1
    fillet1_edges = [part.edges().sort_by_distance(p)[0] for p in [
        (70, 3.5, -100),
        (70, 3.5, 0),
    ]]
    fillet(fillet1_edges, radius=FILLET1_R)


solid = part.part
